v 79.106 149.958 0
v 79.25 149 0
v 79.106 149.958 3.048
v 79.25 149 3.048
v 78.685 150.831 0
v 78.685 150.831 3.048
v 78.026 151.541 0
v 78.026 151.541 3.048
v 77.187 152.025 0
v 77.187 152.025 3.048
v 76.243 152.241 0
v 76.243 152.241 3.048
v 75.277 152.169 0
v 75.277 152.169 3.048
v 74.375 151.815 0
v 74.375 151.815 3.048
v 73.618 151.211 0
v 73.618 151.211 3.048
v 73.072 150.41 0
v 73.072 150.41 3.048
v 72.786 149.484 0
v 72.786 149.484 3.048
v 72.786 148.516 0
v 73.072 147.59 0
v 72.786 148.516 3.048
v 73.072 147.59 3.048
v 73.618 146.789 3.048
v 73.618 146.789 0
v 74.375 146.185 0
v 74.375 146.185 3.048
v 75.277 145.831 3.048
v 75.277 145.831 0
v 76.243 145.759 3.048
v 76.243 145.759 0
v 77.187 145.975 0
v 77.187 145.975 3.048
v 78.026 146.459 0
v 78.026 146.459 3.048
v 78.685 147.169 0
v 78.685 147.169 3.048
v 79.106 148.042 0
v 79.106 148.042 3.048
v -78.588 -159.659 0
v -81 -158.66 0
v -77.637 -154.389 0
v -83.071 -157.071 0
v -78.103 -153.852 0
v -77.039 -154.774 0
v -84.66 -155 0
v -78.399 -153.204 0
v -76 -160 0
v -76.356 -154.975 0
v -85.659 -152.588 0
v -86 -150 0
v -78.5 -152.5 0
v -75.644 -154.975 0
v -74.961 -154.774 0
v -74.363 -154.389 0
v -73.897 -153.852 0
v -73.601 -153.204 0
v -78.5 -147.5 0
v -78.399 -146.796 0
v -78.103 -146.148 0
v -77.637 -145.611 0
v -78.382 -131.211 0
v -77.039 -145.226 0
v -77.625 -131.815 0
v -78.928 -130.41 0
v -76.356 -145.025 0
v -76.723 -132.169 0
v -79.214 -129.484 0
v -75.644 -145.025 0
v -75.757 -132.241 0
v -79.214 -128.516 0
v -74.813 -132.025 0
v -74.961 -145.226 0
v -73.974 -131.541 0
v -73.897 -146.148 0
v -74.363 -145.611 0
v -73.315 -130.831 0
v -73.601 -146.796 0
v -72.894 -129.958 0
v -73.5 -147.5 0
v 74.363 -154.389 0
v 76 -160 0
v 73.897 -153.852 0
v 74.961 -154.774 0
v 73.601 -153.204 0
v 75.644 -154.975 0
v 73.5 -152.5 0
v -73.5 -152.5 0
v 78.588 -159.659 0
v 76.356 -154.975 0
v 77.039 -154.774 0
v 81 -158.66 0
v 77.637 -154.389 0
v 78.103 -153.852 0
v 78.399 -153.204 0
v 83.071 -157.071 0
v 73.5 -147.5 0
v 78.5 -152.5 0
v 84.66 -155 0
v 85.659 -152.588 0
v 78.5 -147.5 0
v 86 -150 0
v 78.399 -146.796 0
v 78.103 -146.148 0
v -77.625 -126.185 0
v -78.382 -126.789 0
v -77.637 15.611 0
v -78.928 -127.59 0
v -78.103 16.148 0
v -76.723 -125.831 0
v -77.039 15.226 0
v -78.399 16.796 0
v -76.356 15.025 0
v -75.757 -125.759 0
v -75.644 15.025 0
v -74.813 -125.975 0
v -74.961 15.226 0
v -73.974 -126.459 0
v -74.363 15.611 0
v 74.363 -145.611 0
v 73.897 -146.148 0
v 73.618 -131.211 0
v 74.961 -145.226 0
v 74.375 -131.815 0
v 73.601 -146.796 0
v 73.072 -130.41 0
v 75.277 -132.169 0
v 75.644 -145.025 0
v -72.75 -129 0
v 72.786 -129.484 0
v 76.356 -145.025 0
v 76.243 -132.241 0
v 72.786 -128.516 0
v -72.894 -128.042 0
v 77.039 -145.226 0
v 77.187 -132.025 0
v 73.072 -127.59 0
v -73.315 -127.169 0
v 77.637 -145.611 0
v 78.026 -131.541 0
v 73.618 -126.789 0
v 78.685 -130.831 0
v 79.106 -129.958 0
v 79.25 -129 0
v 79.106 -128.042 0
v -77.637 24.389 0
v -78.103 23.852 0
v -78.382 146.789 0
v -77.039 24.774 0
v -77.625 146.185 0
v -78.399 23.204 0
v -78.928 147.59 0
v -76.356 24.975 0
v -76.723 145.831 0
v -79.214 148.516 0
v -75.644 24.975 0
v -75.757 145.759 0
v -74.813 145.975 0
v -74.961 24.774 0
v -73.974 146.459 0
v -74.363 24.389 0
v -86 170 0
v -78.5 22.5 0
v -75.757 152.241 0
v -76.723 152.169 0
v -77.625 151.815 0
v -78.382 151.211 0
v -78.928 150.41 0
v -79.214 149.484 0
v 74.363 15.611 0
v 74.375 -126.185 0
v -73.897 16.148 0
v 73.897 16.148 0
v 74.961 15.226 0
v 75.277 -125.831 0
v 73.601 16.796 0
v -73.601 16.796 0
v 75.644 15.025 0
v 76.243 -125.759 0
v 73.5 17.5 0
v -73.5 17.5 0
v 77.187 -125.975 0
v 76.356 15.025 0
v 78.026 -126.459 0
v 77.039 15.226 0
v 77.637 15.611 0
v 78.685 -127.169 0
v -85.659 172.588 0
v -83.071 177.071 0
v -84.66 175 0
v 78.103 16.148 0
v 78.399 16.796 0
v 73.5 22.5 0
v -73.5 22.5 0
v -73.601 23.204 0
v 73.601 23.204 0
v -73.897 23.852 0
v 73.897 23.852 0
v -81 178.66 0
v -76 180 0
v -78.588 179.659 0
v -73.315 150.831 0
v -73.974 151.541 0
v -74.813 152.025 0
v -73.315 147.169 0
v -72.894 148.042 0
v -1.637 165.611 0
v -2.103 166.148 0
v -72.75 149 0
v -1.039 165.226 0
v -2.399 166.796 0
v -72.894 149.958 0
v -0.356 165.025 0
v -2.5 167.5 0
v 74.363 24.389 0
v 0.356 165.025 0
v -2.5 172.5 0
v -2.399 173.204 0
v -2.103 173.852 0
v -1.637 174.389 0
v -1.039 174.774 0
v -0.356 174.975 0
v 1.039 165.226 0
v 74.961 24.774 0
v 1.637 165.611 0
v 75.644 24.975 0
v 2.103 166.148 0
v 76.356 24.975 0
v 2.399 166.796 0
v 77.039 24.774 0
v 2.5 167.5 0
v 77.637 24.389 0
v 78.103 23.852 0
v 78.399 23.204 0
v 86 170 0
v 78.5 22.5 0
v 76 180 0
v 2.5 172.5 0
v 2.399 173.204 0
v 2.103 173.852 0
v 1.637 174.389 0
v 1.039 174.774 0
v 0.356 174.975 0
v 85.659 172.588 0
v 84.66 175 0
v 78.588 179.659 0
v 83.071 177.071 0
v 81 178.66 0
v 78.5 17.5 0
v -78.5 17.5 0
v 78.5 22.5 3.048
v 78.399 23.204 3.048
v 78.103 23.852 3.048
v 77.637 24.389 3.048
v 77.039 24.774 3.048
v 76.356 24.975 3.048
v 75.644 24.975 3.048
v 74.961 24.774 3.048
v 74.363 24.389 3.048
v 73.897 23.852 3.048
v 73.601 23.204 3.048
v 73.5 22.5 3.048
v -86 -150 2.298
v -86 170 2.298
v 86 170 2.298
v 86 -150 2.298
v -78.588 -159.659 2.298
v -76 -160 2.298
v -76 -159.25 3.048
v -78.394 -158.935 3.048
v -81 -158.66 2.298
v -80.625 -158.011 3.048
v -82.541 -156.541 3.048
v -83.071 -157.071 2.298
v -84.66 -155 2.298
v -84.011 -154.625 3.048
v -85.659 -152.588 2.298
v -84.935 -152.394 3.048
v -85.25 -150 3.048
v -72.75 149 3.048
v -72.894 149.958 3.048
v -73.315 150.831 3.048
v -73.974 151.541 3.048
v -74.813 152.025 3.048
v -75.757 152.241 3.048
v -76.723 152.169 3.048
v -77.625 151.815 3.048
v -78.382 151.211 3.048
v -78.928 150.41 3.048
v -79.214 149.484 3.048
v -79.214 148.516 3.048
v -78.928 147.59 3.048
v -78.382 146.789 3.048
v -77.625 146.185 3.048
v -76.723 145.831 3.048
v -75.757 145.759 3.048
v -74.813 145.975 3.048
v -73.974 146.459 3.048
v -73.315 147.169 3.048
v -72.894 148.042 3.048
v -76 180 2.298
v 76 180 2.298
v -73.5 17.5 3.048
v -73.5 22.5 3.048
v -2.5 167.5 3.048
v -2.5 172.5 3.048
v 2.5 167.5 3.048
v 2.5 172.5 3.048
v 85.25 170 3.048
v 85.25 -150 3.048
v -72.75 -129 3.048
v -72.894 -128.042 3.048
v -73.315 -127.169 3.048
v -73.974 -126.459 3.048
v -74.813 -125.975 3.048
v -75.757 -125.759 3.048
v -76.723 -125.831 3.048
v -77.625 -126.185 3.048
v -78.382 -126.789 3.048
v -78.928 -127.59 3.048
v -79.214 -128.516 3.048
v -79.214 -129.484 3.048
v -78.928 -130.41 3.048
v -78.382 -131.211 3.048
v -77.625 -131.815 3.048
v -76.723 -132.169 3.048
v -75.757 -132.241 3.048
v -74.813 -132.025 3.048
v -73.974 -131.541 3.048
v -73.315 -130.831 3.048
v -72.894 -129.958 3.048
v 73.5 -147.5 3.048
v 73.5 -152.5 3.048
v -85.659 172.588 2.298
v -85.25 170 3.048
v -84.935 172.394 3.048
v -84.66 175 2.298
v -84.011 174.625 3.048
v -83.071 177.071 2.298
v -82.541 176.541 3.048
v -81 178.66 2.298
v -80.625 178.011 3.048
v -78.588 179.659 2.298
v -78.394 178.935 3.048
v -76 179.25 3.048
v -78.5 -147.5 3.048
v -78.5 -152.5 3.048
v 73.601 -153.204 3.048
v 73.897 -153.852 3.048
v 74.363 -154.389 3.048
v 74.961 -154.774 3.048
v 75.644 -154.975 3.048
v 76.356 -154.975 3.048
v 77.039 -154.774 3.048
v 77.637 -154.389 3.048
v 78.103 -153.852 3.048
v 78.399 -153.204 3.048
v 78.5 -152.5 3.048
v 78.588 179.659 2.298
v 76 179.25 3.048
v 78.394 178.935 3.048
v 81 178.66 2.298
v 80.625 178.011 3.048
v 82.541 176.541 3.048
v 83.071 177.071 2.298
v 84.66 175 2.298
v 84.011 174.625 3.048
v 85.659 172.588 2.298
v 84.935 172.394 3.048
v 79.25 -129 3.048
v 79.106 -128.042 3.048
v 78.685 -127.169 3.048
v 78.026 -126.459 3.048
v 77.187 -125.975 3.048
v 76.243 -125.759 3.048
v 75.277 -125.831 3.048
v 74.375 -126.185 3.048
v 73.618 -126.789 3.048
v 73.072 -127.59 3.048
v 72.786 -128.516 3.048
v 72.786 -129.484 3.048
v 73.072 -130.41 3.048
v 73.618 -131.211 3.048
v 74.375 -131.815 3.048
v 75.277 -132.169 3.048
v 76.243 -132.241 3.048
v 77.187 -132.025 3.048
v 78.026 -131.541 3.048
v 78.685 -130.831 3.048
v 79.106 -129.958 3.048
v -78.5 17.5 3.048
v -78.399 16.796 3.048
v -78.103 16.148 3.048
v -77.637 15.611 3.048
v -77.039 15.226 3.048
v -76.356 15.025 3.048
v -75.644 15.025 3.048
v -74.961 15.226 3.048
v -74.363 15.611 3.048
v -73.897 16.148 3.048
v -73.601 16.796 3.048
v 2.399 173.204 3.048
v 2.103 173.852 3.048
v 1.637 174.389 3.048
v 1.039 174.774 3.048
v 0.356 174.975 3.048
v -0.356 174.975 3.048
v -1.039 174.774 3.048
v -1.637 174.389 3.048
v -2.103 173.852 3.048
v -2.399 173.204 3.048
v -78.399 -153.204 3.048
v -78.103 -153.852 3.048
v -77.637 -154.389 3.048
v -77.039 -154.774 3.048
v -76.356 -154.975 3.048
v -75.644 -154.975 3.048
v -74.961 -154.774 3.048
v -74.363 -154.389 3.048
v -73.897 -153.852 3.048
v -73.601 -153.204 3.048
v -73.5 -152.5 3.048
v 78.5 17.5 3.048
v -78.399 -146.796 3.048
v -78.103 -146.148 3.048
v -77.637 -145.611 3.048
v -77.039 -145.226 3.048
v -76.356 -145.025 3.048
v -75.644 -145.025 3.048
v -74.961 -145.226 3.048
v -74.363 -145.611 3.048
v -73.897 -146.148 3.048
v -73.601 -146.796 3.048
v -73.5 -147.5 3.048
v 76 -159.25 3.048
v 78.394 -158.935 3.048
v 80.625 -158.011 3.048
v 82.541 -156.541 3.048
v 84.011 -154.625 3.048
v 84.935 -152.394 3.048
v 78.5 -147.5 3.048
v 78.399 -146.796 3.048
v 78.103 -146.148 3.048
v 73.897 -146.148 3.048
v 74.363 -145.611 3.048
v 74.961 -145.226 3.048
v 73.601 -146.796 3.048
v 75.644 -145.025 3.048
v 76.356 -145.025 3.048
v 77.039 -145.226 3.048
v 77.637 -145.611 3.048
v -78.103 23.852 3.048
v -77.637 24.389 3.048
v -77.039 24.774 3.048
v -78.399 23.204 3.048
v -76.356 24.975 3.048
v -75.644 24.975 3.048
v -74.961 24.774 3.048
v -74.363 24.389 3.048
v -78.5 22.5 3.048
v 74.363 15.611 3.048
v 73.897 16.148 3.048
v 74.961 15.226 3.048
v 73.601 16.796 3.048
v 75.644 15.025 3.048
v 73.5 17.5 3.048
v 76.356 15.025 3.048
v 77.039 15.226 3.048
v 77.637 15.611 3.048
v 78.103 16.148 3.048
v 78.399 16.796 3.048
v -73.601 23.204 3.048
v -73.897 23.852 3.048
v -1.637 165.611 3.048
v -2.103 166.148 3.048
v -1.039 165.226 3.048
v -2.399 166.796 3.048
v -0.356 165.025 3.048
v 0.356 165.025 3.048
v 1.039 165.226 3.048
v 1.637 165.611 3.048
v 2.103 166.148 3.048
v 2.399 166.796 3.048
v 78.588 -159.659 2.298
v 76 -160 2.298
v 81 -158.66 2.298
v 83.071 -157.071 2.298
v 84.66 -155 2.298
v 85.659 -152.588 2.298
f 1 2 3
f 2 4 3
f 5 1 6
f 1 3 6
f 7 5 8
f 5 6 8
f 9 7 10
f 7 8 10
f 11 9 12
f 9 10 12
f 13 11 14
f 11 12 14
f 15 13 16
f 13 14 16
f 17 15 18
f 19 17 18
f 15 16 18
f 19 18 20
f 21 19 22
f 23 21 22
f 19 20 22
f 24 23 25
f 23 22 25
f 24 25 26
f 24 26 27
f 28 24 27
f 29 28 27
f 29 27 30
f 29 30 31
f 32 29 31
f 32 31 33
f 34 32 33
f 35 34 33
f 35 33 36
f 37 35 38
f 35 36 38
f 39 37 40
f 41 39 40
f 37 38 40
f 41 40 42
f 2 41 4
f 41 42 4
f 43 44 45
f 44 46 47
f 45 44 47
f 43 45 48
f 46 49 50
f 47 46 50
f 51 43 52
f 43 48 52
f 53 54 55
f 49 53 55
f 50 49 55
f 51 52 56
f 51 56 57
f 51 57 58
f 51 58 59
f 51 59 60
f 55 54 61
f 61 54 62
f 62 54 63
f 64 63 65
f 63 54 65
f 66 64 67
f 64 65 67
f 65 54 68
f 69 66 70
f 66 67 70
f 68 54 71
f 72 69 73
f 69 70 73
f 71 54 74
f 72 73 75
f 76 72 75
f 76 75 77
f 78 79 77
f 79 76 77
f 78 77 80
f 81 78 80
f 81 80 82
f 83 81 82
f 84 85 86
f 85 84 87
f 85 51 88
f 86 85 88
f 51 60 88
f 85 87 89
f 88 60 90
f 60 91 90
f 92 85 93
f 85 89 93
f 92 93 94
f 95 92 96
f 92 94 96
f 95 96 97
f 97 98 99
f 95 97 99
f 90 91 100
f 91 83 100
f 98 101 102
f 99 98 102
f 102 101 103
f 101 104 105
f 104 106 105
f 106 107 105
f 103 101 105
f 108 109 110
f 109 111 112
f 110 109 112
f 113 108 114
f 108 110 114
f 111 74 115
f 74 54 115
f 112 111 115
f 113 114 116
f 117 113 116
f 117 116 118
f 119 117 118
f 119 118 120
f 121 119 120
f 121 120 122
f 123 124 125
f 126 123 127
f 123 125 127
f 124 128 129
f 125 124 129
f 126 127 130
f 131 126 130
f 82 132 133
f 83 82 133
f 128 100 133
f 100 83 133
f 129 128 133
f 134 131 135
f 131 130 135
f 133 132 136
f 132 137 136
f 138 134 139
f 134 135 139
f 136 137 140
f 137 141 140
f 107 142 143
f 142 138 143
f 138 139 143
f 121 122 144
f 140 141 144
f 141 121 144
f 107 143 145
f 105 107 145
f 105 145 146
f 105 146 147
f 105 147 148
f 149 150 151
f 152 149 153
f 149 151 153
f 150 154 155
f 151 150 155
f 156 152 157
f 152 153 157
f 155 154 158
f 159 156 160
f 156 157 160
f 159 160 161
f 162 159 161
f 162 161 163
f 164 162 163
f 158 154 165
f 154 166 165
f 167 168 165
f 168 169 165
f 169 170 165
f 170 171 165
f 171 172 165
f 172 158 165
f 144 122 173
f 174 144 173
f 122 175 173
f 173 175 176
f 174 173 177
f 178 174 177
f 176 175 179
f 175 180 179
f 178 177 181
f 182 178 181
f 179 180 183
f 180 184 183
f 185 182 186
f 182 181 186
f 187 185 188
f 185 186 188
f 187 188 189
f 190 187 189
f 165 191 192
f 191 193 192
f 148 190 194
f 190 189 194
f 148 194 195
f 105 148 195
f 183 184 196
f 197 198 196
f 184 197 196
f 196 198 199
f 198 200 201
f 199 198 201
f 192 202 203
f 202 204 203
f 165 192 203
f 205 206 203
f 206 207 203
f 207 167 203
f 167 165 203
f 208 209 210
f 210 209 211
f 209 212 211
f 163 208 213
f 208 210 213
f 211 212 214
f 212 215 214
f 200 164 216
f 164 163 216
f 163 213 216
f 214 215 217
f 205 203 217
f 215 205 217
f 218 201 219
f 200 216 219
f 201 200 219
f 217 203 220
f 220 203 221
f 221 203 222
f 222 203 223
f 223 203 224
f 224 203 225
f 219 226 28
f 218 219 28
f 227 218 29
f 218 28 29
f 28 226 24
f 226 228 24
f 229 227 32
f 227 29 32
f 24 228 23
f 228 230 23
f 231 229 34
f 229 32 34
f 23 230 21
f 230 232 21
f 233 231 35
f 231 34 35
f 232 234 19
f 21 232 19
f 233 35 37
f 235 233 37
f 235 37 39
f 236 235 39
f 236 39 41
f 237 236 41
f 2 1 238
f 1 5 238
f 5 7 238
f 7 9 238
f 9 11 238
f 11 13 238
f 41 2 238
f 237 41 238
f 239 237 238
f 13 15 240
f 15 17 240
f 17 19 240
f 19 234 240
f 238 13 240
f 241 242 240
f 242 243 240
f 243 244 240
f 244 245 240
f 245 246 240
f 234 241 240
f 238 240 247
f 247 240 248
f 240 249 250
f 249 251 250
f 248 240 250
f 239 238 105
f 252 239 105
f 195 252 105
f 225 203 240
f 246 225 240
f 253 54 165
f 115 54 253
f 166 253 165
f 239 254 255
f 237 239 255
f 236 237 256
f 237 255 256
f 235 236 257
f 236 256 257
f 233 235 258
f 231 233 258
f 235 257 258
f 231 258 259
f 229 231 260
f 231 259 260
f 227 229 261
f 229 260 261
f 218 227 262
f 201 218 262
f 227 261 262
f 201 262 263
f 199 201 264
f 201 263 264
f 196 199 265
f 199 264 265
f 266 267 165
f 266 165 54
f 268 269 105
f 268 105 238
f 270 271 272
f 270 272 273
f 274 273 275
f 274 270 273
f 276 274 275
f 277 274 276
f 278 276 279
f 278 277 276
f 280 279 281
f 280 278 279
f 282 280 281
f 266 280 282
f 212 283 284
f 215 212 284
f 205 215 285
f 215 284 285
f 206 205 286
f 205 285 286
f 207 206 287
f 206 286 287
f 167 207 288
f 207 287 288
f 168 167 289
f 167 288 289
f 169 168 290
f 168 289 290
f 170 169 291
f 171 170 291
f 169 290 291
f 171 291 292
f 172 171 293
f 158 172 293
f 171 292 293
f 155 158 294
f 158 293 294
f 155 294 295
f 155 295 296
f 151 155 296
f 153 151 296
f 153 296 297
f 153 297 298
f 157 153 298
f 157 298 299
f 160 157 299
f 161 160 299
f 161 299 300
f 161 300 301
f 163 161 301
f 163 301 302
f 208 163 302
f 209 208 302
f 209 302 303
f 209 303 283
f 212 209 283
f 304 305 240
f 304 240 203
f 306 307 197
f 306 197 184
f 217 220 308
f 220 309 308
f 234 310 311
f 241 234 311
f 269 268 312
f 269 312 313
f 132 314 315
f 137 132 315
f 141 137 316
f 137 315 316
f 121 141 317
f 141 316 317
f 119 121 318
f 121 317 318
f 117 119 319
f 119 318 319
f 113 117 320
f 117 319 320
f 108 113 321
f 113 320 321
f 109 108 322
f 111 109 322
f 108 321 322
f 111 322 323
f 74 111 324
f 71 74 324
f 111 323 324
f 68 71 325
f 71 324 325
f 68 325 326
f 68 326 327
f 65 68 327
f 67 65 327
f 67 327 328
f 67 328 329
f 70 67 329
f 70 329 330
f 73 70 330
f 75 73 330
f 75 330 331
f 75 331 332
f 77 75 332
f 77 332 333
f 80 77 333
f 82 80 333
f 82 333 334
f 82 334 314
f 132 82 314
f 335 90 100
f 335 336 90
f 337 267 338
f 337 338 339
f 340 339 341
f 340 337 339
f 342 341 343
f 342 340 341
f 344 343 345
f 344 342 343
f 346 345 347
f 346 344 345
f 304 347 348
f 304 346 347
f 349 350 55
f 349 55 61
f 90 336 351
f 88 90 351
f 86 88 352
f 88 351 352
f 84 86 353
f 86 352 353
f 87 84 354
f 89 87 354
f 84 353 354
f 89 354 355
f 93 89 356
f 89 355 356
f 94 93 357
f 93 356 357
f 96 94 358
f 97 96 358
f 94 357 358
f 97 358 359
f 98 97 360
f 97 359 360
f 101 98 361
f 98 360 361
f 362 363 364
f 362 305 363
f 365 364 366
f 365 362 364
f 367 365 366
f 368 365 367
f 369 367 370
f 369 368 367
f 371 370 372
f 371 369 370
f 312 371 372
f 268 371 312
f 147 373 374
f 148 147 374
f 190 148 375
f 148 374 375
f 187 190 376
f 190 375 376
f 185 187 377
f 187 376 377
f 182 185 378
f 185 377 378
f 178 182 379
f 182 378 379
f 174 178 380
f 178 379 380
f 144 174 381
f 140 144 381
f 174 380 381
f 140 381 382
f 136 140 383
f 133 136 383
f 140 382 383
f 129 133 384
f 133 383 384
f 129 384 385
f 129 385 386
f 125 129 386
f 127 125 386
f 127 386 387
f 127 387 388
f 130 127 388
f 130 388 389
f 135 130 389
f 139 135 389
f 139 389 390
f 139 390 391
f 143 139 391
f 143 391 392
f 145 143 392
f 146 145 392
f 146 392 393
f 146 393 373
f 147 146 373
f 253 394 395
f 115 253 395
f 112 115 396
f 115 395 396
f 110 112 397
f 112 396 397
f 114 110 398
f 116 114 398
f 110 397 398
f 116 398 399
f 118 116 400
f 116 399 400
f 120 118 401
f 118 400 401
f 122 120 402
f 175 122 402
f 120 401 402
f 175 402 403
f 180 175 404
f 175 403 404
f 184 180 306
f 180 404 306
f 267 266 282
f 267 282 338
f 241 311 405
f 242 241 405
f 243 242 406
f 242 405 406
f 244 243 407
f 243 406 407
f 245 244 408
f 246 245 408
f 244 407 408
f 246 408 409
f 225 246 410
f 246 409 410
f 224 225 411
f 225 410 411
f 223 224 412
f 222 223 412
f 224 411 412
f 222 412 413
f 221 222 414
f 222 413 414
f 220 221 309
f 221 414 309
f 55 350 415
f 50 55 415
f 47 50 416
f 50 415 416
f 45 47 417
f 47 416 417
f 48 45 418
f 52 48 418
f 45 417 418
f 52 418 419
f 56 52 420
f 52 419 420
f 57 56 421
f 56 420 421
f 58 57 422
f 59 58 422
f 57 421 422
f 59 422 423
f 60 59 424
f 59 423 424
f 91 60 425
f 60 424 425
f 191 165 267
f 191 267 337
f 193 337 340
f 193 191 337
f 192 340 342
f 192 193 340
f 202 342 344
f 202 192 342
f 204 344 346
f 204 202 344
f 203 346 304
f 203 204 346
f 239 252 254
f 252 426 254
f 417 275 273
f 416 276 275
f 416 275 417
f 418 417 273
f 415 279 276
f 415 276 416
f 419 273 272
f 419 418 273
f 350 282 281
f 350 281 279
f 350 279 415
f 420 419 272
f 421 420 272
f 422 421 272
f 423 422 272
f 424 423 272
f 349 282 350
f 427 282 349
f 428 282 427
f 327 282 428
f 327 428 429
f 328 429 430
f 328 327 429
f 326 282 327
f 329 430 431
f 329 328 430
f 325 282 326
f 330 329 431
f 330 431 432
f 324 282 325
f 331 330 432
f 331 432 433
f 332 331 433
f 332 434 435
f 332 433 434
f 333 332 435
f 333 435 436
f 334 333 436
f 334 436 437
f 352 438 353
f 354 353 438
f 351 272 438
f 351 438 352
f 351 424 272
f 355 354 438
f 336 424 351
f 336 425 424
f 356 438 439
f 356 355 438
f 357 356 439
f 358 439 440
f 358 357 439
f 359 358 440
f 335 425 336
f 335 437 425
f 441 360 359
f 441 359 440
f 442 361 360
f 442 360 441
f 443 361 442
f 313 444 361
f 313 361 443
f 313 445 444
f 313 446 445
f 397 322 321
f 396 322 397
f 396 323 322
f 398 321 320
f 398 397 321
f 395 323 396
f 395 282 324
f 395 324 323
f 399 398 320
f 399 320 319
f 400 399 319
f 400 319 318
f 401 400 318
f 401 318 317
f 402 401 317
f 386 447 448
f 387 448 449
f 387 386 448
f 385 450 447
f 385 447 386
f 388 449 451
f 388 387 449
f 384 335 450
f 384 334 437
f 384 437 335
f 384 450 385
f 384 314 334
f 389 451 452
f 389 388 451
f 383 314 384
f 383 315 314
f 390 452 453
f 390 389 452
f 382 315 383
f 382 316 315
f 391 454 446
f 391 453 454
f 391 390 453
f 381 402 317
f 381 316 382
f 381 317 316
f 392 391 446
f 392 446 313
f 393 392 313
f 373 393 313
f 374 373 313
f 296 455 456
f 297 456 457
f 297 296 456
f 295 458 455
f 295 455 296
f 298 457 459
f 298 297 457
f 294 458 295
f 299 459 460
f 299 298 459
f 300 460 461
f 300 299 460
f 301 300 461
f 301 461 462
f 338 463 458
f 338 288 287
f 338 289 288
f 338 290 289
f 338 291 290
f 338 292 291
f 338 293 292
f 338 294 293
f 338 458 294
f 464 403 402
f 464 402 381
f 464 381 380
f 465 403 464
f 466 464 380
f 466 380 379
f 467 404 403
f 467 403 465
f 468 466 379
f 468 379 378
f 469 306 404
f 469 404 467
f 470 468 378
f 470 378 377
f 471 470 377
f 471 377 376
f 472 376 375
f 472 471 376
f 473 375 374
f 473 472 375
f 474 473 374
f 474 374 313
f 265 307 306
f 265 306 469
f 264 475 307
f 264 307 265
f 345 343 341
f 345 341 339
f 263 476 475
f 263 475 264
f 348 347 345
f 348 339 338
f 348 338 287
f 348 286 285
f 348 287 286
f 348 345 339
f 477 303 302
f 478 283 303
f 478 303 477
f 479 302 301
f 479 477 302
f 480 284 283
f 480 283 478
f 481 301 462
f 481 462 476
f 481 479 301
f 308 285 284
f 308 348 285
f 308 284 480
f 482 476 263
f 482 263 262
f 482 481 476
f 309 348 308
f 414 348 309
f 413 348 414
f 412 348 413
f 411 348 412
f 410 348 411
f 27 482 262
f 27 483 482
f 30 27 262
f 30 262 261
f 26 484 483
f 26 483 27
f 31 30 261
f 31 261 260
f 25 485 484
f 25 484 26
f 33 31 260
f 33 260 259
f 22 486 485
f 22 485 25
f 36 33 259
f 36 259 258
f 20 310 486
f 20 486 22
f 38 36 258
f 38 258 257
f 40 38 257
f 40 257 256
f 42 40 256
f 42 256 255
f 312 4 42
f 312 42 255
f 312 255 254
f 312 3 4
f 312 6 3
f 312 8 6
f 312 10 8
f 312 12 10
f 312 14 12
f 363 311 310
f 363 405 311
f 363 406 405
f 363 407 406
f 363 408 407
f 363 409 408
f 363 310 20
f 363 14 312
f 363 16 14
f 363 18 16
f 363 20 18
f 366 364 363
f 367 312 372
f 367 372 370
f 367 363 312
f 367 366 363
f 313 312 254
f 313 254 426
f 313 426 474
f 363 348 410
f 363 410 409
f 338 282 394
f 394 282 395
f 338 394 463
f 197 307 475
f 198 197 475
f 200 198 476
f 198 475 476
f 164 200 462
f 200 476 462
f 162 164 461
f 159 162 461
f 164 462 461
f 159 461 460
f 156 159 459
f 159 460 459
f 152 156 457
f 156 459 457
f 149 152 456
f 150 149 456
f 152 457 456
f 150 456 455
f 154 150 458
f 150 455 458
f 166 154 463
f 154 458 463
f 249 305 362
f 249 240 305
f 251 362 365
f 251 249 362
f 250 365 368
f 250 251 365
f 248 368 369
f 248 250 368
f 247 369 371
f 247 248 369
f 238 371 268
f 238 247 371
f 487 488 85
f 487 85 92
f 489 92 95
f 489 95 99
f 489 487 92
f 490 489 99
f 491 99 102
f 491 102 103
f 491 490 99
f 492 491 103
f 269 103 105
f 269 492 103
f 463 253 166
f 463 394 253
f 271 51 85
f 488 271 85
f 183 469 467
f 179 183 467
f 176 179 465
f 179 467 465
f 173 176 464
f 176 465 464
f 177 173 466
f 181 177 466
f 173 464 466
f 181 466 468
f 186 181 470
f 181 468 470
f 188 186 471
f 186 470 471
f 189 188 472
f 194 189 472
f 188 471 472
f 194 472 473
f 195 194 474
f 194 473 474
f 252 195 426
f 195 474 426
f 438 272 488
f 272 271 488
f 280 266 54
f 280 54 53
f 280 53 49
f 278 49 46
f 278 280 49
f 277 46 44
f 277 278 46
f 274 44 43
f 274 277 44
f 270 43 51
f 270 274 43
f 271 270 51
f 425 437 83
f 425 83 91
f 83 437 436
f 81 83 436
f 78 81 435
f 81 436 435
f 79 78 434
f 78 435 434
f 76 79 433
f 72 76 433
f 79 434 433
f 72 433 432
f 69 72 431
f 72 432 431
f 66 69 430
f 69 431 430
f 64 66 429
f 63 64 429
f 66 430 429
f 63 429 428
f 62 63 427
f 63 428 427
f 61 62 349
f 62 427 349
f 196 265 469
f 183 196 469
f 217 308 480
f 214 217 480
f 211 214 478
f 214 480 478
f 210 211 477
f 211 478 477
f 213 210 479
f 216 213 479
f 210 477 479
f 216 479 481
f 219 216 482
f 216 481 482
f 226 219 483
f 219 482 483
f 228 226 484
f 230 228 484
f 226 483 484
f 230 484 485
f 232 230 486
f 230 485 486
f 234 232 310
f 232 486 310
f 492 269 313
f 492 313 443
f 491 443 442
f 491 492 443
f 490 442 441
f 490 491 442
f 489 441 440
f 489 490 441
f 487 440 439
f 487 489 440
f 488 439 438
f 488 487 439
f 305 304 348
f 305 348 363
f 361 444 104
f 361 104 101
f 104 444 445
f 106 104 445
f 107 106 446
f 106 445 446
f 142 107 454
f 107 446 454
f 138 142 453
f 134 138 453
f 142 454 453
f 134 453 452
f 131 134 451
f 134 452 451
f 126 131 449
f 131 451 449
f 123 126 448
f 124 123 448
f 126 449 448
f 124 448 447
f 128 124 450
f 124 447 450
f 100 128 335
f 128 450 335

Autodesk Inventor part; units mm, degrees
ref_plane "YZ Plane" through (0, 0, 0) normal (1, 0, 0) x (0, 1, 0)
ref_plane "XZ Plane" through (0, 0, 0) normal (0, 1, 0) x (-1, 0, 0)
sketch "Sketch1" plane through (0, 0, 0) normal (0, 0, 1) x (1, 0, 0)
  line L0 (-86, -160) -> (86, -160)
  line L1 (86, -160) -> (86, 160)
  line L2 (86, 160) -> (-86, 160)
  line L3 (-86, 160) -> (-86, -160)
  line L4 (-86, -160) -> (86, 160) construction
  line L5 (86, -160) -> (-86, 160) construction
  point P0 (0, 0)
  dimension "d0" = 320
  dimension "d1" = 172
extrude "Plate1" add sketch "Sketch1" along normal blind 3.048
sketch "Sketch2" plane through (0, 0, 3.048) normal (0, 0, 1) x (1, 0, 0)
  circle A0 centre (-76, 149) radius 3.25
  line L0 (0, 144.4317) -> (0, -177.0748)
  line L1 (-144.6038, 10) -> (151.531, 10)
  circle A1 centre (76, 149) radius 3.25
  circle A2 centre (-76, -129) radius 3.25
  circle A3 centre (76, -129) radius 3.25
  point P0 (0, 0)
  dimension "d3" = 0
  dimension "d4" = 10
  dimension "d5" = 6.5
  dimension "d6" = 76
  dimension "d7" = 139
extrude "Cut1" cut sketch "Sketch2" against normal blind 3.048
sketch "Sketch3" plane through (0, 0, 3.048) normal (0, 0, 1) x (1, 0, 0)
  line L0 (-76, -152.5) -> (-76, -147.5) construction
  line L1 (-78.5, -152.5) -> (-78.5, -147.5)
  line L2 (-73.5, -147.5) -> (-73.5, -152.5)
  arc A0 (-78.5, -152.5) -> (-73.5, -152.5) centre (-76, -152.5) ccw
  arc A1 (-73.5, -147.5) -> (-78.5, -147.5) centre (-76, -147.5) ccw
  line L3 (76, -152.5) -> (76, -147.5) construction
  line L4 (73.5, -152.5) -> (73.5, -147.5)
  line L5 (78.5, -147.5) -> (78.5, -152.5)
  arc A2 (73.5, -152.5) -> (78.5, -152.5) centre (76, -152.5) ccw
  arc A3 (78.5, -147.5) -> (73.5, -147.5) centre (76, -147.5) ccw
  line L6 (-23.5, 120) -> (-28.5, 120) construction
  line L7 (-23.5, 122.5) -> (-28.5, 122.5) construction
  line L8 (-28.5, 117.5) -> (-23.5, 117.5) construction
  arc A4 (-23.5, 117.5) -> (-23.5, 122.5) centre (-23.5, 120) ccw construction
  arc A5 (-28.5, 122.5) -> (-28.5, 117.5) centre (-28.5, 120) ccw construction
  line L9 (76, 17.5) -> (76, 22.5) construction
  line L10 (78.5, 17.5) -> (78.5, 22.5)
  line L11 (73.5, 22.5) -> (73.5, 17.5)
  arc A6 (73.5, 17.5) -> (78.5, 17.5) centre (76, 17.5) ccw
  arc A7 (78.5, 22.5) -> (73.5, 22.5) centre (76, 22.5) ccw
  line L12 (86, -160) -> (-86, -160) projected
  line L13 (-86, 160) -> (86, 160) projected
  line L14 (-86, -160) -> (-86, 160) projected
  line L15 (-76, 17.5) -> (-76, 22.5) construction
  line L16 (-78.5, 17.5) -> (-78.5, 22.5)
  line L17 (-73.5, 22.5) -> (-73.5, 17.5)
  arc A8 (-78.5, 17.5) -> (-73.5, 17.5) centre (-76, 17.5) ccw
  arc A9 (-73.5, 22.5) -> (-78.5, 22.5) centre (-76, 22.5) ccw
  line L18 (86, 160) -> (86, -160) projected
  point P0 (0, 0)
  point P1 (-76, -150)
  point P2 (76, -150)
  point P3 (-26, 120)
  point P4 (76, 20)
  point P5 (-76, 20)
  dimension "d12" = 10
  dimension "d13" = 10
  dimension "d14" = 170
  dimension "d16" = 40
  dimension "d17" = 0
  dimension "d18" = 60
  dimension "d19" = 170
  dimension "d20" = 0
  dimension "d21" = 5
  dimension "d22" = 5
  dimension "d23" = 5
  dimension "d24" = 5
  dimension "d25" = 5
  dimension "d26" = 2.5
  dimension "d27" = 2.5
  dimension "d28" = 2.5
  dimension "d29" = 2.5
  dimension "d30" = 2.5
  dimension "d33" = 10
  dimension "d34" = 10
extrude "Cut2" cut sketch "Sketch3" against normal blind 3.048 contours L1 A1 L2 A0 | L4 A3 L5 A2 | A6 L11 A7 L10 | L16 A9 L17 A8
ref_plane "Work Plane1" through (86, 160, 0) normal (0, 0.9659258, -0.258819) x (-1, 0, 0)
fillet "Fillet1" radius 10 2 edges at (-86, -160, 1.524) (86, -160, 1.524)
sketch "Sketch7" plane through (0, 0, 3.048) normal (0, 0, 1) x (1, 0, 0)
  line L0 (86, 160) -> (-86, 160)
  line L1 (-86, 160) -> (86, 160)
  line L2 (86, 160) -> (86, 180)
  line L3 (86, 180) -> (-86, 180)
  line L4 (-86, 180) -> (-86, 160)
  point P0 (0, 0)
  dimension "d50" = 20
sheet face with bend "Face4" sketch "Sketch7" thickness 3.048 toward (0, 0, -1) bend radius 3.048
bend "Bend3"
sketch "Sketch8" plane through (0, 0, 3.048) normal (0, 0, 1) x (1, 0, 0)
  line L0 (0, 167.5) -> (0, 172.5) construction
  line L1 (2.5, 167.5) -> (2.5, 172.5)
  line L2 (-2.5, 172.5) -> (-2.5, 167.5)
  arc A0 (-2.5, 167.5) -> (2.5, 167.5) centre (0, 167.5) ccw
  arc A1 (2.5, 172.5) -> (-2.5, 172.5) centre (0, 172.5) ccw
  line L3 (86, 180) -> (-86, 180) projected
  line L4 (86, 180) -> (86, -150) projected
  line L5 (-86, 180) -> (-86, -150) projected
  point P0 (0, 0)
  point P1 (0, 170)
  dimension "d56" = 2.5
  dimension "d57" = 5
  dimension "d58" = 10
  dimension "d59" = 172
  dimension "d60" = 86
extrude "Cut3" cut sketch "Sketch8" against normal blind 3.048
fillet "Corner Round1" radius 10 2 edges at (86, 180, 1.524) (-86, 180, 1.524)
chamfer "Chamfer1" distance 0.75 angle 45 8 edges at (0, -160, 3.048) (-83.0711, -157.0711, 3.048) (-86, 10, 3.048) (-83.0711, 177.0711, 3.048) (0, 180, 3.048) (83.0711, 177.0711, 3.048) (86, 10, 3.048) (83.0711, -157.0711, 3.048)
equation "\"d12\" = d11"
equation "\"d13\" = d11"
equation "\"d22\" = d21"
equation "\"d23\" = d21"
equation "\"d24\" = d21"
equation "\"d25\" = d21"
equation "\"d27\" = d26"
equation "\"d28\" = d26"
equation "\"d29\" = d28"
equation "\"d30\" = d28"
equation "\"d60\" = 0.5 * d59"
equation "\"BendRadius\" = Thickness"
equation "\"BendReliefWidth\" = Thickness"
equation "\"BendReliefDepth\" = 0.5 * Thickness"
equation "\"CornerReliefSize\" = 4 * Thickness"
equation "\"MinimumRemnant\" = 2 * Thickness"
equation "\"TransitionRadius\" = BendRadius"
equation "\"JacobiRadiusSize\" = BendRadius"
equation "\"GapSize\" = Thickness"
equation "\"d11\" = 10"
properties part number "CCU_Fix"
